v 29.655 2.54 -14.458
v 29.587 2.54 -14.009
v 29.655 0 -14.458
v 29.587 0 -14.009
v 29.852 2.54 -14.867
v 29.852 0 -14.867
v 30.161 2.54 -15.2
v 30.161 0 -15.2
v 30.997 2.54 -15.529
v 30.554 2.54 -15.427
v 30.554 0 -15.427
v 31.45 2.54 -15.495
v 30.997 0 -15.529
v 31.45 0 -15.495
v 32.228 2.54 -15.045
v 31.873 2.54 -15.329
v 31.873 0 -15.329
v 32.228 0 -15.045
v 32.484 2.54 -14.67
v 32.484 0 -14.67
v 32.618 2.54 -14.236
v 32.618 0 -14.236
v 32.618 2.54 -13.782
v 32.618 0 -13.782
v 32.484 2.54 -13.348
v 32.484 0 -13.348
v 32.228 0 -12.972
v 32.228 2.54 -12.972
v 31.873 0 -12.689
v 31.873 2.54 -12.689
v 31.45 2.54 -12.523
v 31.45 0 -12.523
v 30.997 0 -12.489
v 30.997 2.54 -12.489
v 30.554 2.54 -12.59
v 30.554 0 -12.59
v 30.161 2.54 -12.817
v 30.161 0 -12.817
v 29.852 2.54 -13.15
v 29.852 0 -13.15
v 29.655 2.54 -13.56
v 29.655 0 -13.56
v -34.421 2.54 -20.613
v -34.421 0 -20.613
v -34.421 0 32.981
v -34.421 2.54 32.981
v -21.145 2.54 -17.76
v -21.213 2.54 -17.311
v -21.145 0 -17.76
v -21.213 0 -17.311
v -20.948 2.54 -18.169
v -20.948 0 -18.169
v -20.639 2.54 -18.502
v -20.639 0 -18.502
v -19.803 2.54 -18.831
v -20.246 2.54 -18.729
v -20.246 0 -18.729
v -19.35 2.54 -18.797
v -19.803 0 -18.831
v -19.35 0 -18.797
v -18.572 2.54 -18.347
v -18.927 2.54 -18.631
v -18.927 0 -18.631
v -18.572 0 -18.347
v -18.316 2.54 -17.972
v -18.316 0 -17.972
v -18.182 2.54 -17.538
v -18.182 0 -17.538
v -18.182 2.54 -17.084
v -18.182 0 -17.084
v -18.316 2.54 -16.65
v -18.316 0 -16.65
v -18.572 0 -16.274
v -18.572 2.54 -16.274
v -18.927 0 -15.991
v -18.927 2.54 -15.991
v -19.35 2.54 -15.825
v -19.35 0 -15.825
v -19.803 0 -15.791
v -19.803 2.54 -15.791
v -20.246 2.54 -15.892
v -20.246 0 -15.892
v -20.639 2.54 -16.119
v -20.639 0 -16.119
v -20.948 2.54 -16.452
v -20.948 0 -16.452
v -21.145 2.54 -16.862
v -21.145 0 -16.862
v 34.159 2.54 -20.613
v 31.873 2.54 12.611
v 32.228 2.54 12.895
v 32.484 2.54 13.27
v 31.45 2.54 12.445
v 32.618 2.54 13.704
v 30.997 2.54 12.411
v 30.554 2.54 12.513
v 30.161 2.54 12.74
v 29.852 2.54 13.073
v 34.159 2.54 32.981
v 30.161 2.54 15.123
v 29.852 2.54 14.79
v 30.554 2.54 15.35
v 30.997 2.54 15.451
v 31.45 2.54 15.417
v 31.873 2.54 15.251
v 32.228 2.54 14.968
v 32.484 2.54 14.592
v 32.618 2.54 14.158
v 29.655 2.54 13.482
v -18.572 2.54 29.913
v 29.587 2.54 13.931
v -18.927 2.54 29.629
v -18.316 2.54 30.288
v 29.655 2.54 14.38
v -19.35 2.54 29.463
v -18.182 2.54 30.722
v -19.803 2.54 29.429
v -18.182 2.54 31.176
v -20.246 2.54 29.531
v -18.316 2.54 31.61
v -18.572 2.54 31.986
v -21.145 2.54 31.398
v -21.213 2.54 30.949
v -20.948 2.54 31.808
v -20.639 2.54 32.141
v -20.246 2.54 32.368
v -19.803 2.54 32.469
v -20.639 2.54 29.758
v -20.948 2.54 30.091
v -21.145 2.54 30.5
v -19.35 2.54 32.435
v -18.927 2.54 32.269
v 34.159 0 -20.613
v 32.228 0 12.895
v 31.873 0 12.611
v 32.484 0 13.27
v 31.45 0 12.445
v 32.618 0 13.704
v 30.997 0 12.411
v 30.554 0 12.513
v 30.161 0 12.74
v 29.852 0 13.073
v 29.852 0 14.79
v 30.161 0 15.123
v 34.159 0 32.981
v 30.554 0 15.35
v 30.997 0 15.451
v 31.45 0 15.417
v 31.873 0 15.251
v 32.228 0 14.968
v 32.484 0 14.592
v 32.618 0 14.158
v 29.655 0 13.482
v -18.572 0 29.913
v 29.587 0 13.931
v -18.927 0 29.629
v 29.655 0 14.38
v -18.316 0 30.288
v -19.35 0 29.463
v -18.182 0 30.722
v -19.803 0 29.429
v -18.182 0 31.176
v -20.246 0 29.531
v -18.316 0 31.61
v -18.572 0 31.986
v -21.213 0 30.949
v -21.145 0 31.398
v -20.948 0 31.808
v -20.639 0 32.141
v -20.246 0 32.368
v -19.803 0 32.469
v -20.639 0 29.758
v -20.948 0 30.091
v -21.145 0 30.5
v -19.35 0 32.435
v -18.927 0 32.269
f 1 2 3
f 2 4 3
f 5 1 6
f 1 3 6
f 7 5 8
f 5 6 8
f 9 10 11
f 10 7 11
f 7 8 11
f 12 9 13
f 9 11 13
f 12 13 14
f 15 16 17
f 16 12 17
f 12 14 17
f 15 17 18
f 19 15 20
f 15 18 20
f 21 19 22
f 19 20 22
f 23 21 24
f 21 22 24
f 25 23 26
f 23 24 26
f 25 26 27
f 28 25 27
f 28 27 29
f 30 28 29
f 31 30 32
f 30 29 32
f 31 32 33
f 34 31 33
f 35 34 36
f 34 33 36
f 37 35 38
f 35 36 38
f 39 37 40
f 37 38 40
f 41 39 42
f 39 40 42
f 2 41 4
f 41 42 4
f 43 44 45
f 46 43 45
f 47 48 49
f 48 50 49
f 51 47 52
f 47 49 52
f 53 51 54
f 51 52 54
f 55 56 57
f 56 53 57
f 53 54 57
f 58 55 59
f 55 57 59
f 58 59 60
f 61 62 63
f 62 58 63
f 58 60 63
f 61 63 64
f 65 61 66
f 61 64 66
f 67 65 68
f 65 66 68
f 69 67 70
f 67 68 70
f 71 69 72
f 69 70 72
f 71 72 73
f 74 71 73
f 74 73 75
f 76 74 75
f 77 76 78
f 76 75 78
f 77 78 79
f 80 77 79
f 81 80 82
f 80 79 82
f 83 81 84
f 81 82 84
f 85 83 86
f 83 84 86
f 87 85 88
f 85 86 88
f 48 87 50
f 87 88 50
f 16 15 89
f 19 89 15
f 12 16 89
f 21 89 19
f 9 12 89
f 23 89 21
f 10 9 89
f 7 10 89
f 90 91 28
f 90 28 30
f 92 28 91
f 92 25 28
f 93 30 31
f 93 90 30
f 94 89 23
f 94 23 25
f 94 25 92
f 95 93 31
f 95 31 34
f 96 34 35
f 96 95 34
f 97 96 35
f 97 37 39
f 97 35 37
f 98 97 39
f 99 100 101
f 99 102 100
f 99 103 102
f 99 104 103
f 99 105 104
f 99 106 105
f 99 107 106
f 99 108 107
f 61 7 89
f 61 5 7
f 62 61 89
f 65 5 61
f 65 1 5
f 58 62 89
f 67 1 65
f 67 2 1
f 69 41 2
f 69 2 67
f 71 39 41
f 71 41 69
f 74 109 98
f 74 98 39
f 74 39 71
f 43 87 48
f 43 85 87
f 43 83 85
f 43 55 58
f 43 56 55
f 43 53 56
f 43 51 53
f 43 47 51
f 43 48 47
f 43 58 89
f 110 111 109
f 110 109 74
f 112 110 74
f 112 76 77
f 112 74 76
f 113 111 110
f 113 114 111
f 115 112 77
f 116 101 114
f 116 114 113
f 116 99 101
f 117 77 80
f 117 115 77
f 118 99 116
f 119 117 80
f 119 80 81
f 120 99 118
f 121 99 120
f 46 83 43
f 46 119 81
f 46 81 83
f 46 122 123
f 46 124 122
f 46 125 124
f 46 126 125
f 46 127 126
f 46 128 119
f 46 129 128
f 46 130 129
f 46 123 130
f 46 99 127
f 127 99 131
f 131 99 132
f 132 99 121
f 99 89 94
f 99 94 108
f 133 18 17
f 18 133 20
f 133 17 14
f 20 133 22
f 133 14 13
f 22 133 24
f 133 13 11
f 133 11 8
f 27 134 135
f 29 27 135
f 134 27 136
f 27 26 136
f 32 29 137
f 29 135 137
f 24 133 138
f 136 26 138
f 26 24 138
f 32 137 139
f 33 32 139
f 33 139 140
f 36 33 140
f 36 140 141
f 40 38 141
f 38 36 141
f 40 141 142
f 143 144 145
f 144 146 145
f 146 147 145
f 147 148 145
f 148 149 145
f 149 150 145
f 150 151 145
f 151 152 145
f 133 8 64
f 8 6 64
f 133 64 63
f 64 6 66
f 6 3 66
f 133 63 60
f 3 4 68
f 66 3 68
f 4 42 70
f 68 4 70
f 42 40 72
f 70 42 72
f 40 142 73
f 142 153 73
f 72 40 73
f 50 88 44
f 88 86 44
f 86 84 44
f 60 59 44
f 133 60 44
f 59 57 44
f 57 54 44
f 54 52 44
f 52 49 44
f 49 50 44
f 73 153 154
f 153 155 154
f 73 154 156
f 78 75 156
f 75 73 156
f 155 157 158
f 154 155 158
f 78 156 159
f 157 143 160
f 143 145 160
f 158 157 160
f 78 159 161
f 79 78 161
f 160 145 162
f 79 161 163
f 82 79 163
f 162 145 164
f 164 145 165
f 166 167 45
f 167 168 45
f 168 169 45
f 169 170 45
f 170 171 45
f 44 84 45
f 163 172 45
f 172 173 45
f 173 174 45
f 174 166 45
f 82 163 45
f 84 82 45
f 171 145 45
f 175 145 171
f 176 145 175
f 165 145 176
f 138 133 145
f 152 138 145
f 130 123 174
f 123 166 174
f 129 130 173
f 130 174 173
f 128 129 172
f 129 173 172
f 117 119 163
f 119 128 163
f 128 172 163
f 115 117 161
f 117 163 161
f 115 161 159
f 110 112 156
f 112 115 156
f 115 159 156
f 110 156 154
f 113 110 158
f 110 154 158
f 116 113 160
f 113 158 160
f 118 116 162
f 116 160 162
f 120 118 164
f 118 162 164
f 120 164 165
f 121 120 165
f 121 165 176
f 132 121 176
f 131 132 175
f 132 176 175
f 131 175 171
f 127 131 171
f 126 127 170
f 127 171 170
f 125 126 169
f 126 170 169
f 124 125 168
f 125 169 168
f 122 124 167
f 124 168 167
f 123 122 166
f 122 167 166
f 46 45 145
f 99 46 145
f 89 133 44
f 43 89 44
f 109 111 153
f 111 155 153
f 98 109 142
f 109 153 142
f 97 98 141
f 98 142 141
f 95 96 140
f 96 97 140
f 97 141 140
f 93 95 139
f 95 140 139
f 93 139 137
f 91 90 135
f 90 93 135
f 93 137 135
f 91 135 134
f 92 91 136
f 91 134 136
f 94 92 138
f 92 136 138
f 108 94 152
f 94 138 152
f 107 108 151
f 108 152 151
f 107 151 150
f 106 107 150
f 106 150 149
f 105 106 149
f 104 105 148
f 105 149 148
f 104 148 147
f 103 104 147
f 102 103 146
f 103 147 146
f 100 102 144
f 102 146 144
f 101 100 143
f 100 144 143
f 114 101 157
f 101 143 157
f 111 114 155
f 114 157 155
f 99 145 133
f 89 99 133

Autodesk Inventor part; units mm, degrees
ref_plane "YZ Plane" through (0, 0, 0) normal (1, 0, 0) x (0, 1, 0)
ref_plane "XZ Plane" through (0, 0, 0) normal (0, 1, 0) x (-1, 0, 0)
ref_plane "XY Plane" through (0, 0, 0) normal (0, 0, 1) x (1, 0, 0)
sketch "Sketch1" plane through (0, 0, 0) normal (0, 1, 0) x (-1, 0, 0)
  line L0 (34.4209, 32.9812) -> (-34.1591, 32.9812)
  line L1 (-34.1591, 32.9812) -> (-34.1591, -20.6128)
  line L2 (-34.1591, -20.6128) -> (34.4209, -20.6128)
  line L3 (34.4209, -20.6128) -> (34.4209, 32.9812)
  circle A0 centre (19.6889, 30.9492) radius 1.524
  circle A1 centre (19.6889, -17.3108) radius 1.524
  circle A2 centre (-31.1111, -14.0088) radius 1.524
  circle A3 centre (-31.1111, 13.9312) radius 1.524
  point P0 (0, 0)
  dimension "d0" = 68.58
  dimension "d1" = 53.594
  dimension "d2" = 14.732
  dimension "d3" = 2.032
  dimension "d4" = 3.048
  dimension "d5" = 48.26
  dimension "d6" = 6.604
  dimension "d7" = 3.048
  dimension "d8" = 27.94
extrude "Extrusion1" add sketch "Sketch1" along normal blind 2.54
properties part number "arduino uno model"
